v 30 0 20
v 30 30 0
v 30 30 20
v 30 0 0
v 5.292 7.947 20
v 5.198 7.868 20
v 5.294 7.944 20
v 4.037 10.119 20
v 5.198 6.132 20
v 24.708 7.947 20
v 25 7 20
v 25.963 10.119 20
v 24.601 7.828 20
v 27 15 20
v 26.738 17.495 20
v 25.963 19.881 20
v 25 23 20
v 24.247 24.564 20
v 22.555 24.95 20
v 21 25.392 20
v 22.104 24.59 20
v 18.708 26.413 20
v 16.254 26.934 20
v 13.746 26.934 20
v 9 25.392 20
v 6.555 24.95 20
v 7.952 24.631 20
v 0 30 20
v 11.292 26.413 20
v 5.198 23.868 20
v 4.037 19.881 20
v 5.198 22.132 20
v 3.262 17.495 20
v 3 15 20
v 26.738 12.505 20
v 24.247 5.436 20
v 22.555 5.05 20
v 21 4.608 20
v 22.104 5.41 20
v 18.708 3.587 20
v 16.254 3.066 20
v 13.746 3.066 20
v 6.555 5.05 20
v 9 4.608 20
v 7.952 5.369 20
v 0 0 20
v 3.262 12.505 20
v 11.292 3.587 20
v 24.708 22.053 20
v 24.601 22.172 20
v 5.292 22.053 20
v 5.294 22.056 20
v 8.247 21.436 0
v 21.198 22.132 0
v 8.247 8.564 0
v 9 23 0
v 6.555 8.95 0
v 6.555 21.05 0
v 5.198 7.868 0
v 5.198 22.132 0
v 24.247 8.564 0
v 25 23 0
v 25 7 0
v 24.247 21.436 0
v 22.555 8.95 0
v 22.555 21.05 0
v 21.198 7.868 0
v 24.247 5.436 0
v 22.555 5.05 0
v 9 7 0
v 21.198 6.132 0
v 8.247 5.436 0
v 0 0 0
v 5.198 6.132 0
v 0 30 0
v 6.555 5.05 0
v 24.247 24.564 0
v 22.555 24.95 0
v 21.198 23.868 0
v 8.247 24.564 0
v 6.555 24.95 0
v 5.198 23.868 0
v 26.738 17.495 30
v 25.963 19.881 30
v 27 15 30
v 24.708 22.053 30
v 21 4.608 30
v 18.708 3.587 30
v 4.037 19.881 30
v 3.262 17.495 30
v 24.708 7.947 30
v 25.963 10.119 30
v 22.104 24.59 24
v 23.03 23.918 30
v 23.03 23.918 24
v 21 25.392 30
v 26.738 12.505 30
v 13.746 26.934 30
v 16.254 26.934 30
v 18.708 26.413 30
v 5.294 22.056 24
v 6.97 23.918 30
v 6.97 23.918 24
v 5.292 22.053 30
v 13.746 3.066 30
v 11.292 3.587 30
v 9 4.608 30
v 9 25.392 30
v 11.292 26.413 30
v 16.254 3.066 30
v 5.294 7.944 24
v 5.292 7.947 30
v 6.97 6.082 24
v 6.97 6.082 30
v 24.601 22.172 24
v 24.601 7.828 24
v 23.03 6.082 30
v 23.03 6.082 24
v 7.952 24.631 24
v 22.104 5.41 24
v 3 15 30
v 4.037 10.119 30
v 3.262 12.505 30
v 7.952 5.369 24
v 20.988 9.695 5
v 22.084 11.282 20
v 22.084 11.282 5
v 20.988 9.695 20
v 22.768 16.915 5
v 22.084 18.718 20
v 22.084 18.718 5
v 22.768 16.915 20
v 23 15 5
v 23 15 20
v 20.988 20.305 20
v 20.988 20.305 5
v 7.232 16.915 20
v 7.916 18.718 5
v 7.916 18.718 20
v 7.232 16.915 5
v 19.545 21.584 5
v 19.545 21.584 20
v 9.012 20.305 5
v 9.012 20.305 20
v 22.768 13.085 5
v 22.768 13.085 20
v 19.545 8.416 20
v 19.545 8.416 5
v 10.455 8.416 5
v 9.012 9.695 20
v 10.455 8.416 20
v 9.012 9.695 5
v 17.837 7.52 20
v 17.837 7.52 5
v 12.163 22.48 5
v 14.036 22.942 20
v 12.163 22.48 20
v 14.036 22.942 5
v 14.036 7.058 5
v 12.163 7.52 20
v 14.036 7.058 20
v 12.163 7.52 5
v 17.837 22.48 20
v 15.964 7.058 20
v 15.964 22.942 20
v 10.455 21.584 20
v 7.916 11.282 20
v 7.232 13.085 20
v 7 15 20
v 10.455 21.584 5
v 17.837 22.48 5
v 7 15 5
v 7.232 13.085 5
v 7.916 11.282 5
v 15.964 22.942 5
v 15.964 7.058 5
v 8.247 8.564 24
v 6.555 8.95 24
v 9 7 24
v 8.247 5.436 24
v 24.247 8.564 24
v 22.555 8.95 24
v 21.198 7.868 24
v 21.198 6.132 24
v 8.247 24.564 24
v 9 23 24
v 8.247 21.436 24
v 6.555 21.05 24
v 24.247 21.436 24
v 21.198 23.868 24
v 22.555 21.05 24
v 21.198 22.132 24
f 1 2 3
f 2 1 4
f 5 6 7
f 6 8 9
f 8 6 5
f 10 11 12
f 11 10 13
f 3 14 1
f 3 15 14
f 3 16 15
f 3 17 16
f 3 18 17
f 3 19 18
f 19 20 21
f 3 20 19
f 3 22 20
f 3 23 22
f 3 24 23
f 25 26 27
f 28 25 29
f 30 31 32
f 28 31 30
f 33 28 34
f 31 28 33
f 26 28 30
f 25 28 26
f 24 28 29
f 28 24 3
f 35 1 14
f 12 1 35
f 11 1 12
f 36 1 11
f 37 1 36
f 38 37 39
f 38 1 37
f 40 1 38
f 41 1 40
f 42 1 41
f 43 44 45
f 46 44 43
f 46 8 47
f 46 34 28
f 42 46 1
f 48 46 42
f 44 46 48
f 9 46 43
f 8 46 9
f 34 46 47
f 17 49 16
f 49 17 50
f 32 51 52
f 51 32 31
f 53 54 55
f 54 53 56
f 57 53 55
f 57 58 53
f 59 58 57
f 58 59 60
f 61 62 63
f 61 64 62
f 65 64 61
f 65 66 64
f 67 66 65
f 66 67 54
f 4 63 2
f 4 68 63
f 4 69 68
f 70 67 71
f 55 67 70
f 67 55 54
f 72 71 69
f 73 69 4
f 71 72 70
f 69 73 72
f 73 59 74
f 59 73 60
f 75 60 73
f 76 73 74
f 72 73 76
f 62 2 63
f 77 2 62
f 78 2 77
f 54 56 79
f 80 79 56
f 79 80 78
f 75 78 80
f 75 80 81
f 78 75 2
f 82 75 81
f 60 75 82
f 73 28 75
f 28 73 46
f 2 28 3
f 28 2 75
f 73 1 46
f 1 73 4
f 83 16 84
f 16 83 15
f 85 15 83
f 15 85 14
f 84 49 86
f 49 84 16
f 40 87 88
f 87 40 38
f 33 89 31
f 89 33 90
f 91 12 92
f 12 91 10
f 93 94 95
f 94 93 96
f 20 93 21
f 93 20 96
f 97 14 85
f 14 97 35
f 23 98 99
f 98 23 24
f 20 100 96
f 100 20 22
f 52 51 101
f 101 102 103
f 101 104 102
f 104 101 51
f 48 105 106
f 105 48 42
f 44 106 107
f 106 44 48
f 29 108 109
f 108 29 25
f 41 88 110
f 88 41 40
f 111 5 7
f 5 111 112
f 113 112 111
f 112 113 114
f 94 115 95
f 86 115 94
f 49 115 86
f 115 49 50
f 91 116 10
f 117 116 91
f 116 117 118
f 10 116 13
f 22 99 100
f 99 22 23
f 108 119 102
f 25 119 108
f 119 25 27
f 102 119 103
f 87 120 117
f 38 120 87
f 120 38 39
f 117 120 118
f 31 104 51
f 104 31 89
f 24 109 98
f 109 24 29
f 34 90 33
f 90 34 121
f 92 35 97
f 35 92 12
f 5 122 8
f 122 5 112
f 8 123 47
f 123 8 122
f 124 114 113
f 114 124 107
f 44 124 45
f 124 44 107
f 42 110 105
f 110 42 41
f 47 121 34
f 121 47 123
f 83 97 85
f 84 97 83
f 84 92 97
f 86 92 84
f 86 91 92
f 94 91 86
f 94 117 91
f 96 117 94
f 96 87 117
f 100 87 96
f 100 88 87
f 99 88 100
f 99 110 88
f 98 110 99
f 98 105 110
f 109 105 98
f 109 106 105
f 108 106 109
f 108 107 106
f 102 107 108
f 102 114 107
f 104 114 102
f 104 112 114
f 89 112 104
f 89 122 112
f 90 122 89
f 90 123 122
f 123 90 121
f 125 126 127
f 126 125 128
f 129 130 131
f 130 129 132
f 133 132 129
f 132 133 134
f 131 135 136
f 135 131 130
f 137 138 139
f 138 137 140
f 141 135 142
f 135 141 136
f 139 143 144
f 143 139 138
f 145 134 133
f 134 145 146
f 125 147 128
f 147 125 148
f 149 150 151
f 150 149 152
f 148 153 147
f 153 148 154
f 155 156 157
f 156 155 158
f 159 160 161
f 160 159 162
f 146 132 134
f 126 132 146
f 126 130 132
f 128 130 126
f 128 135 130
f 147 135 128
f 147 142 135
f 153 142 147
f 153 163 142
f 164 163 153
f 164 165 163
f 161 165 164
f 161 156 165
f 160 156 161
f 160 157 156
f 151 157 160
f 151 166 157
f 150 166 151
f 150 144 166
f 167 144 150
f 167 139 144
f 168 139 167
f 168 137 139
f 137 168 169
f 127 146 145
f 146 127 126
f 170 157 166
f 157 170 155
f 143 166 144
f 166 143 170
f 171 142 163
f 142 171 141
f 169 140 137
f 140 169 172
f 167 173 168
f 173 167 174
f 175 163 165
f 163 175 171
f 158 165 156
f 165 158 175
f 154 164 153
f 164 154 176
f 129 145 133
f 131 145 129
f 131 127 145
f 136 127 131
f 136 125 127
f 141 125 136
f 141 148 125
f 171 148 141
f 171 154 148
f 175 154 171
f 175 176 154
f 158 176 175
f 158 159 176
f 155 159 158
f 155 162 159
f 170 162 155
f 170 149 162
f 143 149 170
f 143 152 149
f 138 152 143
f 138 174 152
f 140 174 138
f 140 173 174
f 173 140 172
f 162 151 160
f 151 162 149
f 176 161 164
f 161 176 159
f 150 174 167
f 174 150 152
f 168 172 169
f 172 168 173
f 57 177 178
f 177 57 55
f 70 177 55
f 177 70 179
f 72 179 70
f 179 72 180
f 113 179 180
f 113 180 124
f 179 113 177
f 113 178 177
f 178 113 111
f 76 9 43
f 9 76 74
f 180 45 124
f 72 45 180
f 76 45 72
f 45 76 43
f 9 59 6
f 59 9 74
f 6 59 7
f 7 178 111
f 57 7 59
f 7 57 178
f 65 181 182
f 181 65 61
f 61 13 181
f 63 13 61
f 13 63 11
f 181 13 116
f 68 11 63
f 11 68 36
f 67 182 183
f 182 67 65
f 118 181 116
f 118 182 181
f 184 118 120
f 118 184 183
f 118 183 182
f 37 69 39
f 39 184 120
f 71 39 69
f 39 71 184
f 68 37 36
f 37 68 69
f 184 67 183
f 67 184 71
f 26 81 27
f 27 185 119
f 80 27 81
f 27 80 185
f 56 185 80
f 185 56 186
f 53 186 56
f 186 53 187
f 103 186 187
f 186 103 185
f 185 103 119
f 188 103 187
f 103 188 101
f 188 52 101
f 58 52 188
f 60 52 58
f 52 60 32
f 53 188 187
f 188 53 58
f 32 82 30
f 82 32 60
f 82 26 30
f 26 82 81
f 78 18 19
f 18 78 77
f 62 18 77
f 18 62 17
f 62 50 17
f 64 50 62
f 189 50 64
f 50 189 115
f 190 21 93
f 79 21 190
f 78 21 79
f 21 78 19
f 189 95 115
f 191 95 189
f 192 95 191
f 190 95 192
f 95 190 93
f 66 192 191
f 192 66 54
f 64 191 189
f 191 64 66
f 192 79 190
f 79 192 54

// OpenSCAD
// Demo: Complex shape combining multiple operations
// Note: Sphere subtraction from union+cylinder can cause CSG edge cases
// This version uses cylinders only for maximum robustness
difference() {
    // Main body - union of cube and cylinder
    union() {
        cube([30, 30, 20]);
        translate([15, 15, 0])
            cylinder(h=30, r=12);
    }
    
    // Subtract large cylinder from center (instead of sphere)
    translate([15, 15, 5])
        cylinder(h=15, r=8);
    
    // Subtract small cylinders as holes
    translate([7, 7, -1])
        cylinder(h=25, r=2);
    translate([23, 7, -1])
        cylinder(h=25, r=2);
    translate([7, 23, -1])
        cylinder(h=25, r=2);
    translate([23, 23, -1])
        cylinder(h=25, r=2);
}
